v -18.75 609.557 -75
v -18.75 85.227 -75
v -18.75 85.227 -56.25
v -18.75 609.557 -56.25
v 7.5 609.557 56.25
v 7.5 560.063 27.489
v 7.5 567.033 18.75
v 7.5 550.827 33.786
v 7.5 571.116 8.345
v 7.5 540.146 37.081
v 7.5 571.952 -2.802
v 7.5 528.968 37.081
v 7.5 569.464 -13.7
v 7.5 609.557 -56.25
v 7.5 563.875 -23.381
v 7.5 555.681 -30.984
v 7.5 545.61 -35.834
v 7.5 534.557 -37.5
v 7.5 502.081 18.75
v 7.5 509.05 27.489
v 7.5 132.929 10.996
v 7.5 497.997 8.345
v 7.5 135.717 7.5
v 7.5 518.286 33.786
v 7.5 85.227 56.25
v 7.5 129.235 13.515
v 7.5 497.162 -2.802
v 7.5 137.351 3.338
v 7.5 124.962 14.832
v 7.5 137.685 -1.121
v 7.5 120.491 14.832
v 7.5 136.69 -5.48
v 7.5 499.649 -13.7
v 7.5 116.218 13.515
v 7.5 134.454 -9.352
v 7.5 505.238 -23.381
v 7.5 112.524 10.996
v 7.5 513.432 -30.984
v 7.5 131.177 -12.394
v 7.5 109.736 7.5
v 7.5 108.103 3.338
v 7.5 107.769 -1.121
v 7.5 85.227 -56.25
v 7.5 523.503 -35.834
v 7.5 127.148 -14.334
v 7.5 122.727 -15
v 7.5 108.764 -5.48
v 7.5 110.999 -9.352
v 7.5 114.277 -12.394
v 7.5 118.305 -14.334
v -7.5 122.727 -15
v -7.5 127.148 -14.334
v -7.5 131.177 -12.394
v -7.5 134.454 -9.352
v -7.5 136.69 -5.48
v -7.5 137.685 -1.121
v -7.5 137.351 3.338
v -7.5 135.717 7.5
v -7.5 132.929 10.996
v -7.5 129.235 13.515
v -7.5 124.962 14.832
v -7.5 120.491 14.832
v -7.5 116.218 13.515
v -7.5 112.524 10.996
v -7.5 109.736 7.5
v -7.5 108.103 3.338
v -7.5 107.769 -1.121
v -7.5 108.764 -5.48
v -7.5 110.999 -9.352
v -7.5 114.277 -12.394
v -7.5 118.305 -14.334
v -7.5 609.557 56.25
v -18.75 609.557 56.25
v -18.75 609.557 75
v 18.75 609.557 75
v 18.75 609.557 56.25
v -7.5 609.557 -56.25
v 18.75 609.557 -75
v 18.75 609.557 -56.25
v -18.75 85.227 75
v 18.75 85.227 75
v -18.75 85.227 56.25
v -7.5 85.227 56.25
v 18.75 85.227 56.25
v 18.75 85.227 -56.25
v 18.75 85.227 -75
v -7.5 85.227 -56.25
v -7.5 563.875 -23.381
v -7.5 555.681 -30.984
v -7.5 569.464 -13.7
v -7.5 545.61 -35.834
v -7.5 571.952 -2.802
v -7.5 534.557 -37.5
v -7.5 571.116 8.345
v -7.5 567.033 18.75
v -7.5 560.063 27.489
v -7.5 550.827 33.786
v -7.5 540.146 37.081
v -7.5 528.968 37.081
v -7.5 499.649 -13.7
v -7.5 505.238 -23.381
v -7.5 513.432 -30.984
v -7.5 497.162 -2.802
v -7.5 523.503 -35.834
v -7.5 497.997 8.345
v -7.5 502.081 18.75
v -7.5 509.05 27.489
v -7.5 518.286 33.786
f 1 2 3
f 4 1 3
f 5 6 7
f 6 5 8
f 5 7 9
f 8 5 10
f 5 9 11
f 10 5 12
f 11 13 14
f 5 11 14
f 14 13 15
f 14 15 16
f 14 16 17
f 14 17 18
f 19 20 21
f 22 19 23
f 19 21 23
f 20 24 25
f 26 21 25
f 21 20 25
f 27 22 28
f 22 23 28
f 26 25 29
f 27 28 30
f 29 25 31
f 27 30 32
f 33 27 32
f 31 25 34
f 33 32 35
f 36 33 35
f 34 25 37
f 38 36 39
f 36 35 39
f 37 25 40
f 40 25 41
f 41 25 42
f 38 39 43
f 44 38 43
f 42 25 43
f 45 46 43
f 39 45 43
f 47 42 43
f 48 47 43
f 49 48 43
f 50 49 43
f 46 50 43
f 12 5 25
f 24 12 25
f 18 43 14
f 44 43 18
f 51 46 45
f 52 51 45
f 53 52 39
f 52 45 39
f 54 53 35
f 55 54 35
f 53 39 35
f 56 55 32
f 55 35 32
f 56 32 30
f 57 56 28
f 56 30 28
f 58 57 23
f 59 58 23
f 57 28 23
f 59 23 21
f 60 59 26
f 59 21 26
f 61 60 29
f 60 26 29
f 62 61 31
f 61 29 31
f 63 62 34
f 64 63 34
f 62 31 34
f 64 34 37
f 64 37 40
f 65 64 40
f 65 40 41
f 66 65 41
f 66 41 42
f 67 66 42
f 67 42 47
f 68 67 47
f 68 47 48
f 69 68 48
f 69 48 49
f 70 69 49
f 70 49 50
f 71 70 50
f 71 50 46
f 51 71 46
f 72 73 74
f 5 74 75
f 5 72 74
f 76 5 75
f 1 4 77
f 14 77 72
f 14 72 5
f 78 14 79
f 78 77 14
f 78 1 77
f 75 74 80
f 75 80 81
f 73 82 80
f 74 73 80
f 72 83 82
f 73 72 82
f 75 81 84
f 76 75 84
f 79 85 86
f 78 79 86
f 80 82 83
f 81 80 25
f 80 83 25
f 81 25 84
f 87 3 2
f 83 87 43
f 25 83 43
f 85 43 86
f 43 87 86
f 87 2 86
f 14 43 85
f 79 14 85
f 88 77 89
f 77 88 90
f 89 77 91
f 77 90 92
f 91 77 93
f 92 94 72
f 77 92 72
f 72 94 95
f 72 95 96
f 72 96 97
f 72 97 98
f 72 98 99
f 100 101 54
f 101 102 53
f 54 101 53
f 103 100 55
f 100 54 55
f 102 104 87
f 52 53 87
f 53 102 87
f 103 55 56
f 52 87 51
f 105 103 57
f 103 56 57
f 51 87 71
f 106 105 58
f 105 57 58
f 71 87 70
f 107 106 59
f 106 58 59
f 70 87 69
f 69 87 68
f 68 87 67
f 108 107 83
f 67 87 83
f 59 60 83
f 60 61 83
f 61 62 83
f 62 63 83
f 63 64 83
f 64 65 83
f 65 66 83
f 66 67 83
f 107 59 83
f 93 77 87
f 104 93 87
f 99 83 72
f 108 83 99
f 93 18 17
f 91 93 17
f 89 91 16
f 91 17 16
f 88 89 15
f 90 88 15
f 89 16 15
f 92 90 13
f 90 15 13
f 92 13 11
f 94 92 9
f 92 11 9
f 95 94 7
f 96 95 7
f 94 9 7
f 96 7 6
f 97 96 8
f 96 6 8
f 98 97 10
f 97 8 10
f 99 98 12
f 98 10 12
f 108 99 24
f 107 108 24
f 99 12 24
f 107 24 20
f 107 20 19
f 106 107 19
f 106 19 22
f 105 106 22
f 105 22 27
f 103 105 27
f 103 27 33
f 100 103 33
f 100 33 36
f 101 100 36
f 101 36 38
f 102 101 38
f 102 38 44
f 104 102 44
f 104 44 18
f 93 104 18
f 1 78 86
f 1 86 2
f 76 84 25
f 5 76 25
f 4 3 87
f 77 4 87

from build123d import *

# Parameters (mm, degrees)
BOSS_EXTRUDE1_DEPTH = 699.106666667
SKETCH2_R           = 50
SKETCH2_R_2         = 20
CUT_EXTRUDE1_DEPTH  = 1000
SCALE1_SCALE        = 0.75


with BuildPart() as part:
    # Sketch1 → Boss-Extrude1 (new body)
    with BuildSketch(Plane(origin=(0, 0, 0), x_dir=(1, 0, 0), z_dir=(0, 1, 0))):
        Polygon((-25, -75), (-25, -100), (25, -100), (25, -75), (10, -75), (10, 75), (25, 75), (25, 100), (-25, 100), (-25, 75), (-10, 75), (-10, -75), align=None)
    extrude(amount=BOSS_EXTRUDE1_DEPTH)

    # Sketch2 → Cut-Extrude1 (cut)
    with BuildSketch(Plane(origin=(10, 0, 0), x_dir=(0, 0, -1), z_dir=(1, 0, 0))):
        with Locations((0, 599.106666667)):
            Circle(SKETCH2_R)
        with Locations((0, 50)):
            Circle(SKETCH2_R_2)
    extrude(amount=-CUT_EXTRUDE1_DEPTH, mode=Mode.SUBTRACT)


with BuildPart() as part_1:
    # Scale1: scaled about (0, 340.906804135, 0)
    add(part.part.scale(SCALE1_SCALE).moved(Location((0, 85.226701034, 0))))


solid = part_1.part
